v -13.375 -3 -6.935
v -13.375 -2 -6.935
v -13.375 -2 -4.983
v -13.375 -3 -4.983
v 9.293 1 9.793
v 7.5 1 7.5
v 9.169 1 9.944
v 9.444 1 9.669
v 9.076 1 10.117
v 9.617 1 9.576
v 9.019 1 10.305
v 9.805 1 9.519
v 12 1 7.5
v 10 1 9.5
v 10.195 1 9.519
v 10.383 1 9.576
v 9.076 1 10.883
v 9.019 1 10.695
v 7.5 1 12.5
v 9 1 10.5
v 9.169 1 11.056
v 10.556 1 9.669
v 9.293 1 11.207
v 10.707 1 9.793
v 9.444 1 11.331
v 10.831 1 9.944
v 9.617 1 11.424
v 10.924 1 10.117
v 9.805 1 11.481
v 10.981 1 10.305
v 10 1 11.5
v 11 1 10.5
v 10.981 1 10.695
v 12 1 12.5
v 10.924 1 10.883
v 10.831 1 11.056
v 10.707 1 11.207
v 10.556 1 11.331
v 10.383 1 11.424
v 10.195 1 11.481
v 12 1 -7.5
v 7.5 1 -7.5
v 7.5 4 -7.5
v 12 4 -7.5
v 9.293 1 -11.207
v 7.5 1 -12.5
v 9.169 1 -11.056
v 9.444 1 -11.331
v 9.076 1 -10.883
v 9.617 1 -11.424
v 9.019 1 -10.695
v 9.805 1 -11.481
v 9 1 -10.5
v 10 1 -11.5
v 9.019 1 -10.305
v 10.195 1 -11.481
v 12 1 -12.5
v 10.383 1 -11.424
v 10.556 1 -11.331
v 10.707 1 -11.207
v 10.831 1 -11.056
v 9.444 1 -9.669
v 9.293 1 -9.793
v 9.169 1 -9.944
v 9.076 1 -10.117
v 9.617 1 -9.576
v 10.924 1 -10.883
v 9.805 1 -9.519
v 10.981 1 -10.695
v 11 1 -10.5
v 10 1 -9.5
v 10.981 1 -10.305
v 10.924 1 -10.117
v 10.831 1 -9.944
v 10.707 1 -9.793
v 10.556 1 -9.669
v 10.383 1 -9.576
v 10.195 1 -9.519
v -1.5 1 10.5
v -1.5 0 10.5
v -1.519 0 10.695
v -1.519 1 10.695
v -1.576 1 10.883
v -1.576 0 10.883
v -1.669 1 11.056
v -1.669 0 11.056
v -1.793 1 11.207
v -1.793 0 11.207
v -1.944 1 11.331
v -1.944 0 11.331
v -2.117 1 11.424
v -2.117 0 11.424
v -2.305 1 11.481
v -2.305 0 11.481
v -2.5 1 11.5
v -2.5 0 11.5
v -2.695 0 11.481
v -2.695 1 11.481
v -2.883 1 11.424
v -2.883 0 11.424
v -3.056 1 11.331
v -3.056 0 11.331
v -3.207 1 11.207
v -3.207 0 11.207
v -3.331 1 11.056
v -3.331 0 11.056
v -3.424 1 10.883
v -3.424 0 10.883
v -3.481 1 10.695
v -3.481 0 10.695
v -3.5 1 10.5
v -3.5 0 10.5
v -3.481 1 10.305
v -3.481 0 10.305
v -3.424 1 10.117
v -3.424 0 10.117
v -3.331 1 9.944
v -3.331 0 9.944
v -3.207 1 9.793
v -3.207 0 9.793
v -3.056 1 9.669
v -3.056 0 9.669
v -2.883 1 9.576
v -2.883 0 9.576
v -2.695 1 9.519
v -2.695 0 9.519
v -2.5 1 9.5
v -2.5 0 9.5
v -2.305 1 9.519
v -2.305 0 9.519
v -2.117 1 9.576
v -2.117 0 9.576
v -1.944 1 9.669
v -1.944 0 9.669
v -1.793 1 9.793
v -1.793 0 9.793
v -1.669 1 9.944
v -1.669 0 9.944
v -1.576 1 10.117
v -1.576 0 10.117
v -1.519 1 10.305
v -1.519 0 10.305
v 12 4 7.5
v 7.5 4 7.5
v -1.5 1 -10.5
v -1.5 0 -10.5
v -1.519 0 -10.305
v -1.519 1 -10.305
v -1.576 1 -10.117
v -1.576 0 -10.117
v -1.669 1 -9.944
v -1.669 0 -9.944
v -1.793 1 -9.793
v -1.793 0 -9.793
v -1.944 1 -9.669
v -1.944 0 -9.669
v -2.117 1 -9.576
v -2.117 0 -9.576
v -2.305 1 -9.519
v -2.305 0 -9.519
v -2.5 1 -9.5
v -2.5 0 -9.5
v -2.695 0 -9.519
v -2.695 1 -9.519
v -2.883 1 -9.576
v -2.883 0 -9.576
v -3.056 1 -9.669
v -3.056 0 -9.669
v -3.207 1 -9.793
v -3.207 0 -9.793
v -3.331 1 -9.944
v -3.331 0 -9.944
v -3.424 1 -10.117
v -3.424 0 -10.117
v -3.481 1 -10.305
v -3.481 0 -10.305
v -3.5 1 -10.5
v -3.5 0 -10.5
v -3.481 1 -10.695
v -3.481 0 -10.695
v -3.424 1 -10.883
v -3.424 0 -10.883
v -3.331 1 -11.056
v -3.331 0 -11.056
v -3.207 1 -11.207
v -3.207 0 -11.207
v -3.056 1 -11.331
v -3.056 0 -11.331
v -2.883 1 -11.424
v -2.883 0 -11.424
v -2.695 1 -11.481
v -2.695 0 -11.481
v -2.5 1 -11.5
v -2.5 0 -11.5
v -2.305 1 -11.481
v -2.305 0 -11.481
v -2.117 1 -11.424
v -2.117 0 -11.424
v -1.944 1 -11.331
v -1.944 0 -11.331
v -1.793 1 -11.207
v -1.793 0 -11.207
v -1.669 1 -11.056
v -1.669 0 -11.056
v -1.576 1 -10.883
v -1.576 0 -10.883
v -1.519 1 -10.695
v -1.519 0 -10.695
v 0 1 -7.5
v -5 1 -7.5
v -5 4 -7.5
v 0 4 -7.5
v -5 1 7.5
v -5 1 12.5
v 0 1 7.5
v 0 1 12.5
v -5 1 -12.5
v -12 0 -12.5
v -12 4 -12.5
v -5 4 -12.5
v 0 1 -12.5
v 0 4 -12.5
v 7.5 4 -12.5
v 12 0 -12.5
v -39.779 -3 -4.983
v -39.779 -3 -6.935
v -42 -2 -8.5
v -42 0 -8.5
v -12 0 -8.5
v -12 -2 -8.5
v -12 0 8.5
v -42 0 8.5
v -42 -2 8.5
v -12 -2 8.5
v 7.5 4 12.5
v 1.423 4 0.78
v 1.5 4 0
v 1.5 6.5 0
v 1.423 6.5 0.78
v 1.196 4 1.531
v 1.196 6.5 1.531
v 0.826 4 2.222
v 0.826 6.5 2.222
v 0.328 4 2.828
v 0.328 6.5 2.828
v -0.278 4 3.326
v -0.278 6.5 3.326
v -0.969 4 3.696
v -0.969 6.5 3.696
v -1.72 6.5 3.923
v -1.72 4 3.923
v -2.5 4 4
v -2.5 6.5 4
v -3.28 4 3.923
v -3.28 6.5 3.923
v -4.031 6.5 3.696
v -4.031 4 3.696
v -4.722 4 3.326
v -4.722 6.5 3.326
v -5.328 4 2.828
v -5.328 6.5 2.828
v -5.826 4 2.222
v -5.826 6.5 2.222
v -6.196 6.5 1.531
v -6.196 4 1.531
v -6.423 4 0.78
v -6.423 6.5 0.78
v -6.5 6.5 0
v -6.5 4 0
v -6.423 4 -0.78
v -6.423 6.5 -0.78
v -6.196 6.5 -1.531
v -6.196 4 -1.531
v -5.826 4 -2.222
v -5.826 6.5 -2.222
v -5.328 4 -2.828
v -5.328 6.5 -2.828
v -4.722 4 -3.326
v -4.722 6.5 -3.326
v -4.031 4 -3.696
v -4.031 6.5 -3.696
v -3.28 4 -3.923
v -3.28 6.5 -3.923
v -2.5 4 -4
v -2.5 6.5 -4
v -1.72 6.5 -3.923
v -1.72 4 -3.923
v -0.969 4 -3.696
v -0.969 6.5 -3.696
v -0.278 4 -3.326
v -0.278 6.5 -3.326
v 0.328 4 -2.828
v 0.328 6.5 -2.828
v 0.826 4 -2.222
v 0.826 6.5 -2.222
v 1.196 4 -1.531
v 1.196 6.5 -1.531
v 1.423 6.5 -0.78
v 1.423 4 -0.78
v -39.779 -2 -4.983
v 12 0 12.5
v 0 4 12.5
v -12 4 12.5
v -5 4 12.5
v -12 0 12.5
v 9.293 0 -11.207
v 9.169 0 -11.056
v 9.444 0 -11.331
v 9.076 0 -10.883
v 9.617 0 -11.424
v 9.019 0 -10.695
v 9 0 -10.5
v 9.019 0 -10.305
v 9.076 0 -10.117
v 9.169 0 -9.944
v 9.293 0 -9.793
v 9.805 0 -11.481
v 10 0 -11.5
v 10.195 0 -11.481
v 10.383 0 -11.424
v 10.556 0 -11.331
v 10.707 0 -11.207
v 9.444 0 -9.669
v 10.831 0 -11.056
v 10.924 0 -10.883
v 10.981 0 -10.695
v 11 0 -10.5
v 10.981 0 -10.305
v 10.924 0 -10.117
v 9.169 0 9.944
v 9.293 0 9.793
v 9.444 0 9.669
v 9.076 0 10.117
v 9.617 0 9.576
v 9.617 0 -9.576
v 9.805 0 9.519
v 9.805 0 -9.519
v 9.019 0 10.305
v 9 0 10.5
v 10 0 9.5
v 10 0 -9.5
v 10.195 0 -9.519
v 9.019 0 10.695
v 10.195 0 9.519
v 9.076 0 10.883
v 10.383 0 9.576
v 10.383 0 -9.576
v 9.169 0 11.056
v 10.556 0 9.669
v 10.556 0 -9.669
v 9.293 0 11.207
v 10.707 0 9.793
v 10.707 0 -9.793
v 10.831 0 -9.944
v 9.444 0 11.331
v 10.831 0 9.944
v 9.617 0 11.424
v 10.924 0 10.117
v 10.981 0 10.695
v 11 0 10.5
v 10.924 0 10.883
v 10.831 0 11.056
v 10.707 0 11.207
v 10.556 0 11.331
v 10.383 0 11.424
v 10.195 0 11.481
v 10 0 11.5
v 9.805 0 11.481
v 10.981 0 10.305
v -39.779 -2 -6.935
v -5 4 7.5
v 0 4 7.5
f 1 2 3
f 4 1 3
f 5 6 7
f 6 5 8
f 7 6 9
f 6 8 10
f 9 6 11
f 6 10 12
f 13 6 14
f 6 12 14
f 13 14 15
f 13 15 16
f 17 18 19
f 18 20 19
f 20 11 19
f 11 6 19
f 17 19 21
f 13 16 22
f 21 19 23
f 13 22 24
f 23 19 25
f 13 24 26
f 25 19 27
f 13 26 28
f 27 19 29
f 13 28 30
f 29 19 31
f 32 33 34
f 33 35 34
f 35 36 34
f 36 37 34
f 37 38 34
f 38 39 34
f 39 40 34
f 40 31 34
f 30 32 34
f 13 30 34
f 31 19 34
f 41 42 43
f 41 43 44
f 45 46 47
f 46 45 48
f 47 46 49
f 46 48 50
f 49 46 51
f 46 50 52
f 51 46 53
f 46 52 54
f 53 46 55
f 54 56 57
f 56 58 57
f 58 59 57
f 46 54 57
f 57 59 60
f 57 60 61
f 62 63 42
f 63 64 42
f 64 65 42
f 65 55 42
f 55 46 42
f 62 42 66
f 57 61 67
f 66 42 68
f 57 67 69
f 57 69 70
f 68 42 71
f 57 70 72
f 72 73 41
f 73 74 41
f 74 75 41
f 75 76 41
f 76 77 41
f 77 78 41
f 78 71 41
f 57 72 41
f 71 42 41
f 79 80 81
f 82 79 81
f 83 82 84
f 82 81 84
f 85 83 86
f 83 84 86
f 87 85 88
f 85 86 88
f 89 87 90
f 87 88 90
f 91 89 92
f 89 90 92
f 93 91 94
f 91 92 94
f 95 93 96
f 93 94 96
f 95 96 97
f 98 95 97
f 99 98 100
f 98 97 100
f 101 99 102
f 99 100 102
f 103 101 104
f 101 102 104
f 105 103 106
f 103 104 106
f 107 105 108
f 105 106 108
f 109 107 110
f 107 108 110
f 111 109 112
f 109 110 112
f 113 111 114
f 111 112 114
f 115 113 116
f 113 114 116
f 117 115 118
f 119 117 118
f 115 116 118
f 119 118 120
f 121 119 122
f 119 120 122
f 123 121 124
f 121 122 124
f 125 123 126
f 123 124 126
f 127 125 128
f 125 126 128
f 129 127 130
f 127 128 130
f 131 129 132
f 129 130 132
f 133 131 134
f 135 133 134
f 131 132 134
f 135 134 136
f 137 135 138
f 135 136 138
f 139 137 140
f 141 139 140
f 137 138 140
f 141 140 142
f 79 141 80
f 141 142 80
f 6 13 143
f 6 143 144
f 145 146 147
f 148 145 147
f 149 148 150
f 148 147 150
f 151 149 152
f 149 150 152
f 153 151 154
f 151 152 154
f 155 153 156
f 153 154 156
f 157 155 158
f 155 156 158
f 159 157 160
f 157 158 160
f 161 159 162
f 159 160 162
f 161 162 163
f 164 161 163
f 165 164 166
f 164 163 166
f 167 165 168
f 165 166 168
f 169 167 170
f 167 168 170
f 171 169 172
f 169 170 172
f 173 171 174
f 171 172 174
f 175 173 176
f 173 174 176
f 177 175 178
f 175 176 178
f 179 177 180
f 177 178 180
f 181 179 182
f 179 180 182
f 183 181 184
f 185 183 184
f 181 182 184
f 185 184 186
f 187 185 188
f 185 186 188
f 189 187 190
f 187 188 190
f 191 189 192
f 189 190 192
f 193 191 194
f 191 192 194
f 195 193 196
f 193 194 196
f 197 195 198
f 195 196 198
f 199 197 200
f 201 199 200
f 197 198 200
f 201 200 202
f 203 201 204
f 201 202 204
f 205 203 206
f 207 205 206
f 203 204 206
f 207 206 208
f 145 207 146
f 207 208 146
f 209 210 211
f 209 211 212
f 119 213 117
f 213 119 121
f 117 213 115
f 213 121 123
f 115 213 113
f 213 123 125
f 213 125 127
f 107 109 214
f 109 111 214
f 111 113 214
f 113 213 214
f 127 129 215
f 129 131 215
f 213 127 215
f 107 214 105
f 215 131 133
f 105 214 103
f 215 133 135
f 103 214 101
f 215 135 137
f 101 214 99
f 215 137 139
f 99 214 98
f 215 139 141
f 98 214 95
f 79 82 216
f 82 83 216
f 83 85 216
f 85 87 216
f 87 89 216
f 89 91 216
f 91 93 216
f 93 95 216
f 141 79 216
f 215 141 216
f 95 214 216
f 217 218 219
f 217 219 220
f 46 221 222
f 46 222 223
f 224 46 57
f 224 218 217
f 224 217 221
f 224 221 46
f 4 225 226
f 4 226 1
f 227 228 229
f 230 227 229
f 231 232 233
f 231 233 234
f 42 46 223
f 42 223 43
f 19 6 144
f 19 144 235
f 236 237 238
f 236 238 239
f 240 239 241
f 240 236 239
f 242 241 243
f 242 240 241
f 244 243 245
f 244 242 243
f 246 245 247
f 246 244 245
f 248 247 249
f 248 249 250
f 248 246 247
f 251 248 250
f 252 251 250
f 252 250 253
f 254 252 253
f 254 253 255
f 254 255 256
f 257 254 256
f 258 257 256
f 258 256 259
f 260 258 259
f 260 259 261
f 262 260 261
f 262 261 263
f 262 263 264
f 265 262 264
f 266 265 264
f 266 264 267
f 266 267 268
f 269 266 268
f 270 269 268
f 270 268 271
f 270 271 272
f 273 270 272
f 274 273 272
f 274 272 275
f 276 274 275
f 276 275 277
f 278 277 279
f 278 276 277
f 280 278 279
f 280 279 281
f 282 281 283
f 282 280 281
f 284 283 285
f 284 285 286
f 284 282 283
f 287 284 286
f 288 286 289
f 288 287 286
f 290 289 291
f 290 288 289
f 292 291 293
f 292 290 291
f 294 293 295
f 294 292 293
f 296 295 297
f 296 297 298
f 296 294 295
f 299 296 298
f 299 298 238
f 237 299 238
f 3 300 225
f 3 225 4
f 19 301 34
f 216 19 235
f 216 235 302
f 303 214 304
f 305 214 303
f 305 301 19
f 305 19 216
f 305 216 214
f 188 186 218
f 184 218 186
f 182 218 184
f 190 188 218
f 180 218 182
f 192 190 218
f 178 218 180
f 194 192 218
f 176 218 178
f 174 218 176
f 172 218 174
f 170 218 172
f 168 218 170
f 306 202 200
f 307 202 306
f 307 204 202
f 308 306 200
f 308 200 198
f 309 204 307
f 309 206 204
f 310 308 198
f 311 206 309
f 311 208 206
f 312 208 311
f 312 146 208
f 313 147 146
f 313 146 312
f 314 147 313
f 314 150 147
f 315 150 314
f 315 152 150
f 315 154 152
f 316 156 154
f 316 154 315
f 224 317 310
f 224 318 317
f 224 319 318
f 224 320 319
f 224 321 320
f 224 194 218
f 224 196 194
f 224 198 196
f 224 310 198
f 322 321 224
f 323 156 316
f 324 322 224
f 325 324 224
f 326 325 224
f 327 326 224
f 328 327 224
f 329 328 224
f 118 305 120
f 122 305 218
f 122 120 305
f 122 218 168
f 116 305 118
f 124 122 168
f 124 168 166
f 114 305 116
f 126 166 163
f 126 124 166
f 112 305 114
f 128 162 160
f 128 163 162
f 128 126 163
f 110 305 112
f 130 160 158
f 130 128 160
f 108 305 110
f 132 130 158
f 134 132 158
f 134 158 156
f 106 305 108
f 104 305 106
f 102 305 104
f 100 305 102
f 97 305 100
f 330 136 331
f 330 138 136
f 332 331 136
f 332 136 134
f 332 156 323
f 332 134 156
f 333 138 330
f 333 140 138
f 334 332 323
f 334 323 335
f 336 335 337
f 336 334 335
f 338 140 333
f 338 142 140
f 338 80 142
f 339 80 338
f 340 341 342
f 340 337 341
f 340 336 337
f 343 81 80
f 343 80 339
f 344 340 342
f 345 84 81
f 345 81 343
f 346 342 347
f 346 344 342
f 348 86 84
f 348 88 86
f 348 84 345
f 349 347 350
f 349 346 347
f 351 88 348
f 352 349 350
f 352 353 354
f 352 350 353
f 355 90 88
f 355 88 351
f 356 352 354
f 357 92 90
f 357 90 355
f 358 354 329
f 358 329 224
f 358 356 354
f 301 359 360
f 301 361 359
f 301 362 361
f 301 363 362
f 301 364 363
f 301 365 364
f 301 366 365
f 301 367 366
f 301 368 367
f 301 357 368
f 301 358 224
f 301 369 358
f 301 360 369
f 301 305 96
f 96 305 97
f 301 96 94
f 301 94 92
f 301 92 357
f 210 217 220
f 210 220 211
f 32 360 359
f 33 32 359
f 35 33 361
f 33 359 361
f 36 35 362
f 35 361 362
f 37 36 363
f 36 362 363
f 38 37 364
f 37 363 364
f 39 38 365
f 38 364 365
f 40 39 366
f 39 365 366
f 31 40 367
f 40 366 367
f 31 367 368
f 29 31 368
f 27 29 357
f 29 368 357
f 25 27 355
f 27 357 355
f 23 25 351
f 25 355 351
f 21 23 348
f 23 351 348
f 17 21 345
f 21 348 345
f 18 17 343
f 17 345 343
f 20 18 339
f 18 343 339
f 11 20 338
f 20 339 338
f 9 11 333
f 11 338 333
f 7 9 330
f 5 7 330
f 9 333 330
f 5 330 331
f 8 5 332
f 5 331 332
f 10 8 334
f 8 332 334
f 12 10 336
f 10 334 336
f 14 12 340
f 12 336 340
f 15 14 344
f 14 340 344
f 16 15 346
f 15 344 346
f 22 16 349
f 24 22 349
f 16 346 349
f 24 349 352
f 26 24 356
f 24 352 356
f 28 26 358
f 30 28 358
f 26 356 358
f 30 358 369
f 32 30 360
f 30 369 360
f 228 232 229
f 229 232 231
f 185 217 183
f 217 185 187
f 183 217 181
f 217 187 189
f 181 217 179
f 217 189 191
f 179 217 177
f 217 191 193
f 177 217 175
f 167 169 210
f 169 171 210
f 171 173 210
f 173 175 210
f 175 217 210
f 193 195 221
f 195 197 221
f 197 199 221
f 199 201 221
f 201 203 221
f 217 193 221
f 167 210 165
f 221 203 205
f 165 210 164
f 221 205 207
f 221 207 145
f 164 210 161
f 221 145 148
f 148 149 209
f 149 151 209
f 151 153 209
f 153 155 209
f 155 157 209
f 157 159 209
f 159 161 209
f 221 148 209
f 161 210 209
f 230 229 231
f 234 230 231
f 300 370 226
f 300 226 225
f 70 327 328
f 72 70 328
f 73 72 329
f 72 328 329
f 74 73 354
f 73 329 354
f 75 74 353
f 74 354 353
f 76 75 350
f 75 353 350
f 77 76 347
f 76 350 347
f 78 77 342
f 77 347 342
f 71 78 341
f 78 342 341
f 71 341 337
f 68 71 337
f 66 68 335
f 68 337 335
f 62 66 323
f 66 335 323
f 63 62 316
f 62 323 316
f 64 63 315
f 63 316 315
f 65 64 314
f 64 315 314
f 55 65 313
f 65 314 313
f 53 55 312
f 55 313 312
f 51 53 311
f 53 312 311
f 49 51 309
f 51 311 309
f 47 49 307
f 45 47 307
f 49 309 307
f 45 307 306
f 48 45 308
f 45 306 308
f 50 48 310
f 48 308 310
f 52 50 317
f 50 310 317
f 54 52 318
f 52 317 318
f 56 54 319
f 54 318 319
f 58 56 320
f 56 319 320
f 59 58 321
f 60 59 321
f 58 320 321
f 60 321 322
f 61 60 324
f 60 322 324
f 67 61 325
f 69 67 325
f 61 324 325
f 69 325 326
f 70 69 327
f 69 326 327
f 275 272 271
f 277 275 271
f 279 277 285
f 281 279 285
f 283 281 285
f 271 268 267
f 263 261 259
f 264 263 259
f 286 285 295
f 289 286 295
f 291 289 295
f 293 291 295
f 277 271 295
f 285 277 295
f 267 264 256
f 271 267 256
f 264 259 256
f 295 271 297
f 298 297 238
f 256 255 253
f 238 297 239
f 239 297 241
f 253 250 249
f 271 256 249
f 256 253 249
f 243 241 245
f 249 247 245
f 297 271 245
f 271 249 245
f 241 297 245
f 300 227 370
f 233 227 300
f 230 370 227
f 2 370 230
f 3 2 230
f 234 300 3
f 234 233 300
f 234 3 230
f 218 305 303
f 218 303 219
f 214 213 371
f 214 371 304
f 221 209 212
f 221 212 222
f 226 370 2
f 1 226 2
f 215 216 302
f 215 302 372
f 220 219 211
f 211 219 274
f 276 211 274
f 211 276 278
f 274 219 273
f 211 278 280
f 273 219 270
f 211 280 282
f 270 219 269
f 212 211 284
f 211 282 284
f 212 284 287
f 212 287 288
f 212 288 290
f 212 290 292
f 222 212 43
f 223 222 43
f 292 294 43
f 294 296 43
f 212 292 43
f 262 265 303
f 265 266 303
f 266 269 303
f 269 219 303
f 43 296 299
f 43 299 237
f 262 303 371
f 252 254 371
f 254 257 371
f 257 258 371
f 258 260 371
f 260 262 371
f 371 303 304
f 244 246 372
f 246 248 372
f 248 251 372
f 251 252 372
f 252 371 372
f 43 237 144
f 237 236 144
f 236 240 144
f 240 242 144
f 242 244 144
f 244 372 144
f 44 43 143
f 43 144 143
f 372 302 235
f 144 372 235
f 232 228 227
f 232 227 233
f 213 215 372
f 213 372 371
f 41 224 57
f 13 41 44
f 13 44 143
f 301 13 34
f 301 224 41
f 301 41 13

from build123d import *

# Parameters (mm, degrees)
F0_R     = 4
F1_DEPTH = 4
F0_W     = 30
F0_H     = 17
F0_W_2   = 26.403979
F0_H_2   = 1.952045
F2_DEPTH = 2
F0_W_3   = 4.5
F0_H_3   = 5
F0_R_2   = 1
F0_W_4   = 5
F3_DEPTH = 1
F4_DEPTH = 6.5
F5_DEPTH = 3


with BuildPart() as f1:
    # F0 (on Front) → F1 (new body)
    with BuildSketch(Plane.XZ):
        Polygon((-5, 12.5), (-12, 12.5), (-12, 8.5), (-12, -8.5), (-12, -12.5), (-5, -12.5), (-5, -7.5), (0, -7.5), (0, -12.5), (7.5, -12.5), (7.5, -7.5), (12, -7.5), (12, 7.5), (7.5, 7.5), (7.5, 12.5), (0, 12.5), (0, 7.5), (-5, 7.5), align=None)
        with Locations((-2.5, 0)):
            Circle(F0_R, mode=Mode.SUBTRACT)
    extrude(amount=-F1_DEPTH)

    # F0 (on Front) → F3 (join)
    with BuildSketch(Plane.XZ):
        with Locations((9.75, -10)):
            Rectangle(F0_W_3, F0_H_3)
        with Locations((10, -10.5)):
            Circle(F0_R_2, mode=Mode.SUBTRACT)
        with Locations((9.75, 10)):
            Rectangle(F0_W_3, F0_H_3)
        with Locations((10, 10.5)):
            Circle(F0_R_2, mode=Mode.SUBTRACT)
        with Locations((-2.5, 10)):
            Rectangle(F0_W_4, F0_H_3)
        with Locations((-2.5, 10.5)):
            Circle(F0_R_2, mode=Mode.SUBTRACT)
        with Locations((-2.5, -10)):
            Rectangle(F0_W_4, F0_H_3)
        with Locations((-2.5, -10.5)):
            Circle(F0_R_2, mode=Mode.SUBTRACT)
    extrude(amount=-F3_DEPTH)

    # F0 (on Front) → F4 (join)
    with BuildSketch(Plane.XZ):
        with Locations((-2.5, 0)):
            Circle(F0_R)
    extrude(amount=-F4_DEPTH)


with BuildPart() as f2:
    # F0 (on Front) → F2 (new body)
    with BuildSketch(Plane.XZ):
        with Locations((-27, 0)):
            Rectangle(F0_W, F0_H)
        with Locations((-26.576995, -5.958562)):
            Rectangle(F0_W_2, F0_H_2, mode=Mode.SUBTRACT)
    extrude(amount=F2_DEPTH)

    # F0 (on Front) → F5 (join)
    with BuildSketch(Plane.XZ):
        with Locations((-26.576995, -5.958562)):
            Rectangle(F0_W_2, F0_H_2)
    extrude(amount=F5_DEPTH)


solid = Compound([f1.part, f2.part])
